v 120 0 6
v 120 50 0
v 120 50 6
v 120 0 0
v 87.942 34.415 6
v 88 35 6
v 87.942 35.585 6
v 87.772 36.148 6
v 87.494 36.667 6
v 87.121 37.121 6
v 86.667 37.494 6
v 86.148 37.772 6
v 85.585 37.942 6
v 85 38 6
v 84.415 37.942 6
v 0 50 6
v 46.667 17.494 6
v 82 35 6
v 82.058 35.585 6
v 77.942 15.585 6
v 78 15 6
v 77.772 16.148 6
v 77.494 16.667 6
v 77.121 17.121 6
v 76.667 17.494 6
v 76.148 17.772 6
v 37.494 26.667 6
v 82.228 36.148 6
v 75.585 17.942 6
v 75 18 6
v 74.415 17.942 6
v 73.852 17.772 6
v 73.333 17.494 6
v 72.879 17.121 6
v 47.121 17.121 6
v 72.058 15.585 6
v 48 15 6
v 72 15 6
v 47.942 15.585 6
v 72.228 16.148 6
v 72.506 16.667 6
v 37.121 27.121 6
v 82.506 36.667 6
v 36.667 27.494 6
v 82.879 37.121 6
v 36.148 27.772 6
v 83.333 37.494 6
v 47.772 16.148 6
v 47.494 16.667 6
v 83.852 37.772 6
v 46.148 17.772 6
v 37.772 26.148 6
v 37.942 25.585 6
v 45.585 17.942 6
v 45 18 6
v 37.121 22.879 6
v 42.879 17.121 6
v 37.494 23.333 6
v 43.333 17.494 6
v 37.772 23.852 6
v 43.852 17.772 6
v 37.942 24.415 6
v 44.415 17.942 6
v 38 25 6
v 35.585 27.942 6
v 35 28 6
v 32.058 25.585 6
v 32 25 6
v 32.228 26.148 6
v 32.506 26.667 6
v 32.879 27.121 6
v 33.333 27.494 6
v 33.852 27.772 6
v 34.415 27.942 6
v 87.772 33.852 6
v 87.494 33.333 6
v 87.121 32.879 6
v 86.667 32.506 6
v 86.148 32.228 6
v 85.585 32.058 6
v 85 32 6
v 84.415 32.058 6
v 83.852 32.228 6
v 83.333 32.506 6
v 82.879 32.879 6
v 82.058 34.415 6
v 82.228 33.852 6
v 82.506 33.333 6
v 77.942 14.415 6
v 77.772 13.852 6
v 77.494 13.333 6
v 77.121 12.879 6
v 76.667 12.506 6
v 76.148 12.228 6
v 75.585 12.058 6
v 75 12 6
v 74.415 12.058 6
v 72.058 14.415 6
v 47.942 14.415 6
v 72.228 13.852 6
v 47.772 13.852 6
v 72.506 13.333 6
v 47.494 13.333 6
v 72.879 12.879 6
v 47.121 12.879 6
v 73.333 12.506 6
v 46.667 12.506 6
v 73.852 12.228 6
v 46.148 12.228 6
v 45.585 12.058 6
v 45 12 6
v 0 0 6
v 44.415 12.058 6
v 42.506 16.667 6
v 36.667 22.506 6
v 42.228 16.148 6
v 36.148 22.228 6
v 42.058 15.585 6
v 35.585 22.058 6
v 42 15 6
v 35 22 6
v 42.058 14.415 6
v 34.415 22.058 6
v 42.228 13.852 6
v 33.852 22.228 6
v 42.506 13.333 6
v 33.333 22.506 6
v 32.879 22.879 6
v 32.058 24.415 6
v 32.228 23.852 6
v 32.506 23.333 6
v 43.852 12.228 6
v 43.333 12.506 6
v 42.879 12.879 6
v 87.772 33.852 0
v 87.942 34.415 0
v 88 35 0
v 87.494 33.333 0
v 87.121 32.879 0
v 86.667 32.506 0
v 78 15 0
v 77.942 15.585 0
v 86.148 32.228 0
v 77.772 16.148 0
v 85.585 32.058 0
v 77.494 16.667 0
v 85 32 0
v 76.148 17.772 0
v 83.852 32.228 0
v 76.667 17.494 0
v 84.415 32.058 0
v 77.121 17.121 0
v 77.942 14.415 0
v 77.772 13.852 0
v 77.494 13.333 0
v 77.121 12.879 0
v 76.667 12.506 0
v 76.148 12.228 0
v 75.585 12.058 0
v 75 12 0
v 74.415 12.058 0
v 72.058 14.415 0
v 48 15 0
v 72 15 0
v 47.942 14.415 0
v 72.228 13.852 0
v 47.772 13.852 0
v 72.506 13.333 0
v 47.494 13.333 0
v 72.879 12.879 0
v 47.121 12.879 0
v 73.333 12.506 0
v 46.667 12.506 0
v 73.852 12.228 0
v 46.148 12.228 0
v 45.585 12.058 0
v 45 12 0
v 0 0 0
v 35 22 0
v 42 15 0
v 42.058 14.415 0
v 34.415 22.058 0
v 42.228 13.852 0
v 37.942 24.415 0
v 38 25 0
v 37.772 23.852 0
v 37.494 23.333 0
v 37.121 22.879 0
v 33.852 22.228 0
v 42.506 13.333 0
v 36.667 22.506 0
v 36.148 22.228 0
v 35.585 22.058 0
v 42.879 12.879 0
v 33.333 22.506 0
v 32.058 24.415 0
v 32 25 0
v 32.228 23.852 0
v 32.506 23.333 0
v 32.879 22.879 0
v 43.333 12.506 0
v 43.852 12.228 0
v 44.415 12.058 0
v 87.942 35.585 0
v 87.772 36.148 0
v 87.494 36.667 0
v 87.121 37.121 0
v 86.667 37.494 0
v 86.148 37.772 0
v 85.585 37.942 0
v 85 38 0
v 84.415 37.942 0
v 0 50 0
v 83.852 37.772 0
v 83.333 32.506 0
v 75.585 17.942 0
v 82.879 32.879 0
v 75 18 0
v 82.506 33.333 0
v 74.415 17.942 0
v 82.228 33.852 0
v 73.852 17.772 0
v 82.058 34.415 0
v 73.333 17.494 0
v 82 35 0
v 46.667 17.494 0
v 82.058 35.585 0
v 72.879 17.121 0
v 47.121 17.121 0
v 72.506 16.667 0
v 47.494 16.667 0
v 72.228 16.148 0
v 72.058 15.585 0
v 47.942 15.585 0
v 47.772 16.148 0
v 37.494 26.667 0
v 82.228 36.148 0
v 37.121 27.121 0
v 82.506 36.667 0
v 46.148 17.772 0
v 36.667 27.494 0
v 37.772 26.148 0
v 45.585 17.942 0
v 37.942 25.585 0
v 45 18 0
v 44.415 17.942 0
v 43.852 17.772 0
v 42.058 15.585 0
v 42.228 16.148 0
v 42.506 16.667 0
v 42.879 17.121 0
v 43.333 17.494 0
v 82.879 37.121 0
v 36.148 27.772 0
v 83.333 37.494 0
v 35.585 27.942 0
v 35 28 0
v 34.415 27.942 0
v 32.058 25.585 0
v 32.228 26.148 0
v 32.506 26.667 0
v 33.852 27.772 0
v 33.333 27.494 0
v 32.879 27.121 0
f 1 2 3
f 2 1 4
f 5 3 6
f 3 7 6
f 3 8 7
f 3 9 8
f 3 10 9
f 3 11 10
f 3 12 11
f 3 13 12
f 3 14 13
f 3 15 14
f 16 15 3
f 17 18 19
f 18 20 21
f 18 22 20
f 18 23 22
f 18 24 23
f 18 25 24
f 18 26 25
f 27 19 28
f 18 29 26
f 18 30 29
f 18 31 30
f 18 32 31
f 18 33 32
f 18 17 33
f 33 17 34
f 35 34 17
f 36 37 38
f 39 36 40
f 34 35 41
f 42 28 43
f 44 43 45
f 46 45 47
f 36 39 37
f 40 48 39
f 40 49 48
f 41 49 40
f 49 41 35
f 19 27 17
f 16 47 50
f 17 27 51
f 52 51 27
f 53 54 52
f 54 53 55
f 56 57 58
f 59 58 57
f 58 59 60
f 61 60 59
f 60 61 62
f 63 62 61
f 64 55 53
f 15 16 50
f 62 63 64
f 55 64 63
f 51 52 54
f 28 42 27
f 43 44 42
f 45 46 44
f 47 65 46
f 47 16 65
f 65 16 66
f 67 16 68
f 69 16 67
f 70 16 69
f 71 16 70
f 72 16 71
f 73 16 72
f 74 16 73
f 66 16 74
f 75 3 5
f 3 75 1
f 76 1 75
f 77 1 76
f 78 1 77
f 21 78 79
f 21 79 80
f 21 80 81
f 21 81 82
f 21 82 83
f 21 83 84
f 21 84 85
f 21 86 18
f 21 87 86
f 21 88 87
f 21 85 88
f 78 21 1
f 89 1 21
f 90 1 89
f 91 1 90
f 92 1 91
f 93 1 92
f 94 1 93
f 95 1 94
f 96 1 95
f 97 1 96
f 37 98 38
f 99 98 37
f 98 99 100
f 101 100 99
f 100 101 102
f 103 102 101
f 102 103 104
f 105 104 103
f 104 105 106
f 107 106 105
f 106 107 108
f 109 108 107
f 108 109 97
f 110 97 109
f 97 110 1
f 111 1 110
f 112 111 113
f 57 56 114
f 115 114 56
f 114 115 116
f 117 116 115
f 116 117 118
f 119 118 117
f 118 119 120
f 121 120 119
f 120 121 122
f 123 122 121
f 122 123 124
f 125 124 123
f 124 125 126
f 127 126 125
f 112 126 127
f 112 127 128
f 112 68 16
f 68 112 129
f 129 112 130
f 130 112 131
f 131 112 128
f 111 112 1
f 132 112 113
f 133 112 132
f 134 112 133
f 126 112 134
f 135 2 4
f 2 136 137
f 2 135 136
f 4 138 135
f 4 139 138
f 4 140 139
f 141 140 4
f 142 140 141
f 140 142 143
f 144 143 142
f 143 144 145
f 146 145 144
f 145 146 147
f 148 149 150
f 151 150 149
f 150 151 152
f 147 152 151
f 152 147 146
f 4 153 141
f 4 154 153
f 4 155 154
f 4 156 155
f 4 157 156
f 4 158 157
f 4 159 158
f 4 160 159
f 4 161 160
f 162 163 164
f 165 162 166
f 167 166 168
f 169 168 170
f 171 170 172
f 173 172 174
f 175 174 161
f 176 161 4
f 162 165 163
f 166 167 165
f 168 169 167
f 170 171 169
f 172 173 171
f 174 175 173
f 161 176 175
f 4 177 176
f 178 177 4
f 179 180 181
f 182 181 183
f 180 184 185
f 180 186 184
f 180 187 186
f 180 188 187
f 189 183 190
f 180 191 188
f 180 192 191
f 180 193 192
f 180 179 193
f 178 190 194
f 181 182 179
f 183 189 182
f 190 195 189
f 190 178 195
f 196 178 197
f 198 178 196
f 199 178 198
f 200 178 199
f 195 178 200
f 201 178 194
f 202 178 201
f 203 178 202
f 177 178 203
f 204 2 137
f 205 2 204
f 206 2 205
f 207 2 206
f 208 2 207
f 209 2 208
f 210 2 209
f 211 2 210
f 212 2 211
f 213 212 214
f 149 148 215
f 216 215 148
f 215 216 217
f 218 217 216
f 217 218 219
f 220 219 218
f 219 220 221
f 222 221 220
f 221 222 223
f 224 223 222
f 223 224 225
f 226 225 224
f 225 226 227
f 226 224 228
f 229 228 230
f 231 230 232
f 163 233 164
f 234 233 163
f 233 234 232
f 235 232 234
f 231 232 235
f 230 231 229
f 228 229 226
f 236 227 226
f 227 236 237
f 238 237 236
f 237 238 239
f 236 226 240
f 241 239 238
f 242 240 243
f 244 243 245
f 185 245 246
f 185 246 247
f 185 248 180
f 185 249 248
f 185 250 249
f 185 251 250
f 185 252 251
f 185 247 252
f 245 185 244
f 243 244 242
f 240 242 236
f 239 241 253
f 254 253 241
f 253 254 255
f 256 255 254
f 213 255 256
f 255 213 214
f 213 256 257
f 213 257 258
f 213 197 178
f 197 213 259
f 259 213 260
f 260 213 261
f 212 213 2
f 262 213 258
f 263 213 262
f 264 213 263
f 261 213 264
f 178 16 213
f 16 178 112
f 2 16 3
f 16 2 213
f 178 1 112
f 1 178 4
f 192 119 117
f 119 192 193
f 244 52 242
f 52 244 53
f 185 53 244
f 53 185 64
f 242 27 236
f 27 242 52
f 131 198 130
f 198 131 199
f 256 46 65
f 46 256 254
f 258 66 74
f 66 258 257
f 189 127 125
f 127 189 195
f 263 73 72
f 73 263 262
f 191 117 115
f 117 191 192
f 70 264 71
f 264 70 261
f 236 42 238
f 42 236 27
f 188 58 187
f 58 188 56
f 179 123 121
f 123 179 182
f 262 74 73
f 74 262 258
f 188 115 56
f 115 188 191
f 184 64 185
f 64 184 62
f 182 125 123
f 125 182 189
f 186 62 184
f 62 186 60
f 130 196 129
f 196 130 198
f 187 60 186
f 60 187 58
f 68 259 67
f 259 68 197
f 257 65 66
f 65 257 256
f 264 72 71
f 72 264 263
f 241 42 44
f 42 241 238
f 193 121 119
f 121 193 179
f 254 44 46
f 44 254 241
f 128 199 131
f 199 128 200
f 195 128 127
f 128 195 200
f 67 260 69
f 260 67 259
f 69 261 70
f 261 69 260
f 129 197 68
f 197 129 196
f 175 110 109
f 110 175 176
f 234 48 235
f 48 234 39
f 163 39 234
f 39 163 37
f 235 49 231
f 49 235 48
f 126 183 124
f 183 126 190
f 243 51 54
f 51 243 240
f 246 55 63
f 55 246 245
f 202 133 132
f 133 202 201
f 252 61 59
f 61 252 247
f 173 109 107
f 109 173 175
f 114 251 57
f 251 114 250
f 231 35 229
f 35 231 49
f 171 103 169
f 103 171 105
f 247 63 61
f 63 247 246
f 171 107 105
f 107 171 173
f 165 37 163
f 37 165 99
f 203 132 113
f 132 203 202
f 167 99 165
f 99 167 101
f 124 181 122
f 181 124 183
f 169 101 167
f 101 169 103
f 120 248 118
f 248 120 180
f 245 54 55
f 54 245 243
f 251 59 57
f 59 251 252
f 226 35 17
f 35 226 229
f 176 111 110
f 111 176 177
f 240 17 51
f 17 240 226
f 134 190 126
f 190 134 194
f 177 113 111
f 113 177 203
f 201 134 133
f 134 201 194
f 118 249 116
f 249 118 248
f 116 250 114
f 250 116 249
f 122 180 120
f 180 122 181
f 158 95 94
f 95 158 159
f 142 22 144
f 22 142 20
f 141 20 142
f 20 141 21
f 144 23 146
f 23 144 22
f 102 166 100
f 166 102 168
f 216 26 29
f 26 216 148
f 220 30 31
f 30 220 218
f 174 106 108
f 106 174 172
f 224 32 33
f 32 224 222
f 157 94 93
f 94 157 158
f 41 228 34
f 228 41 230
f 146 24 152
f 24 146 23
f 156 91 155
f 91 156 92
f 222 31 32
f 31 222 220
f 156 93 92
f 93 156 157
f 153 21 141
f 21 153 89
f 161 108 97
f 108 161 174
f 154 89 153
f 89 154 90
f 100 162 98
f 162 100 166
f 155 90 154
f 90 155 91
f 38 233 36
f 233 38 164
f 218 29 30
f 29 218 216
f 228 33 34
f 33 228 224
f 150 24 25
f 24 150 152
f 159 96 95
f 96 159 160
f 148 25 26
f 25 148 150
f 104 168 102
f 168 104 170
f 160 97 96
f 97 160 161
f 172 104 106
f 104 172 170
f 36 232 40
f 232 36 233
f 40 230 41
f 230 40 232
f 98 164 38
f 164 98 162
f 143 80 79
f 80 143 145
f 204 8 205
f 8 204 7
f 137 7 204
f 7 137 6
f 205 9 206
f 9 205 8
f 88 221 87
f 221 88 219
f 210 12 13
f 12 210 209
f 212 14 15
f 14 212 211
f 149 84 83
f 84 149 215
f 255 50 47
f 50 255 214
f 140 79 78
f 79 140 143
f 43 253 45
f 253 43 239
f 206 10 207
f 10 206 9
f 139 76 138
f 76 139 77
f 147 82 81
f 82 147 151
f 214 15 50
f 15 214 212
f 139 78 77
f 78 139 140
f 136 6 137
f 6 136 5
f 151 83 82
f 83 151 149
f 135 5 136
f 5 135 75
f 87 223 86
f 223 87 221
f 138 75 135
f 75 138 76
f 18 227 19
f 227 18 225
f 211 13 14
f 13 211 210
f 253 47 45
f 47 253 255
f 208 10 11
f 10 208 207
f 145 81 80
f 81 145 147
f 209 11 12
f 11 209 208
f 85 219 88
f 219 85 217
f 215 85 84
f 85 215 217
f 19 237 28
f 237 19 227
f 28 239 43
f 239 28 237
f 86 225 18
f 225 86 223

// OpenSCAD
$fn = 32;

// ----------------------------------------------------------------------
// Hole field: plate with holes at given coordinates
// ----------------------------------------------------------------------

// --- parameters (mm) ---
plate_l = 120;            // plate length, X
plate_w = 50;             // plate width, Y
plate_t = 6;              // plate thickness, Z
hole_d = 6;               // hole diameter

difference() {
  cube([plate_l, plate_w, plate_t]);
  translate([35, 25, -1]) cylinder(h = plate_t + 2, d = hole_d);
  translate([45, 15, -1]) cylinder(h = plate_t + 2, d = hole_d);
  translate([75, 15, -1]) cylinder(h = plate_t + 2, d = hole_d);
  translate([85, 35, -1]) cylinder(h = plate_t + 2, d = hole_d);
}
